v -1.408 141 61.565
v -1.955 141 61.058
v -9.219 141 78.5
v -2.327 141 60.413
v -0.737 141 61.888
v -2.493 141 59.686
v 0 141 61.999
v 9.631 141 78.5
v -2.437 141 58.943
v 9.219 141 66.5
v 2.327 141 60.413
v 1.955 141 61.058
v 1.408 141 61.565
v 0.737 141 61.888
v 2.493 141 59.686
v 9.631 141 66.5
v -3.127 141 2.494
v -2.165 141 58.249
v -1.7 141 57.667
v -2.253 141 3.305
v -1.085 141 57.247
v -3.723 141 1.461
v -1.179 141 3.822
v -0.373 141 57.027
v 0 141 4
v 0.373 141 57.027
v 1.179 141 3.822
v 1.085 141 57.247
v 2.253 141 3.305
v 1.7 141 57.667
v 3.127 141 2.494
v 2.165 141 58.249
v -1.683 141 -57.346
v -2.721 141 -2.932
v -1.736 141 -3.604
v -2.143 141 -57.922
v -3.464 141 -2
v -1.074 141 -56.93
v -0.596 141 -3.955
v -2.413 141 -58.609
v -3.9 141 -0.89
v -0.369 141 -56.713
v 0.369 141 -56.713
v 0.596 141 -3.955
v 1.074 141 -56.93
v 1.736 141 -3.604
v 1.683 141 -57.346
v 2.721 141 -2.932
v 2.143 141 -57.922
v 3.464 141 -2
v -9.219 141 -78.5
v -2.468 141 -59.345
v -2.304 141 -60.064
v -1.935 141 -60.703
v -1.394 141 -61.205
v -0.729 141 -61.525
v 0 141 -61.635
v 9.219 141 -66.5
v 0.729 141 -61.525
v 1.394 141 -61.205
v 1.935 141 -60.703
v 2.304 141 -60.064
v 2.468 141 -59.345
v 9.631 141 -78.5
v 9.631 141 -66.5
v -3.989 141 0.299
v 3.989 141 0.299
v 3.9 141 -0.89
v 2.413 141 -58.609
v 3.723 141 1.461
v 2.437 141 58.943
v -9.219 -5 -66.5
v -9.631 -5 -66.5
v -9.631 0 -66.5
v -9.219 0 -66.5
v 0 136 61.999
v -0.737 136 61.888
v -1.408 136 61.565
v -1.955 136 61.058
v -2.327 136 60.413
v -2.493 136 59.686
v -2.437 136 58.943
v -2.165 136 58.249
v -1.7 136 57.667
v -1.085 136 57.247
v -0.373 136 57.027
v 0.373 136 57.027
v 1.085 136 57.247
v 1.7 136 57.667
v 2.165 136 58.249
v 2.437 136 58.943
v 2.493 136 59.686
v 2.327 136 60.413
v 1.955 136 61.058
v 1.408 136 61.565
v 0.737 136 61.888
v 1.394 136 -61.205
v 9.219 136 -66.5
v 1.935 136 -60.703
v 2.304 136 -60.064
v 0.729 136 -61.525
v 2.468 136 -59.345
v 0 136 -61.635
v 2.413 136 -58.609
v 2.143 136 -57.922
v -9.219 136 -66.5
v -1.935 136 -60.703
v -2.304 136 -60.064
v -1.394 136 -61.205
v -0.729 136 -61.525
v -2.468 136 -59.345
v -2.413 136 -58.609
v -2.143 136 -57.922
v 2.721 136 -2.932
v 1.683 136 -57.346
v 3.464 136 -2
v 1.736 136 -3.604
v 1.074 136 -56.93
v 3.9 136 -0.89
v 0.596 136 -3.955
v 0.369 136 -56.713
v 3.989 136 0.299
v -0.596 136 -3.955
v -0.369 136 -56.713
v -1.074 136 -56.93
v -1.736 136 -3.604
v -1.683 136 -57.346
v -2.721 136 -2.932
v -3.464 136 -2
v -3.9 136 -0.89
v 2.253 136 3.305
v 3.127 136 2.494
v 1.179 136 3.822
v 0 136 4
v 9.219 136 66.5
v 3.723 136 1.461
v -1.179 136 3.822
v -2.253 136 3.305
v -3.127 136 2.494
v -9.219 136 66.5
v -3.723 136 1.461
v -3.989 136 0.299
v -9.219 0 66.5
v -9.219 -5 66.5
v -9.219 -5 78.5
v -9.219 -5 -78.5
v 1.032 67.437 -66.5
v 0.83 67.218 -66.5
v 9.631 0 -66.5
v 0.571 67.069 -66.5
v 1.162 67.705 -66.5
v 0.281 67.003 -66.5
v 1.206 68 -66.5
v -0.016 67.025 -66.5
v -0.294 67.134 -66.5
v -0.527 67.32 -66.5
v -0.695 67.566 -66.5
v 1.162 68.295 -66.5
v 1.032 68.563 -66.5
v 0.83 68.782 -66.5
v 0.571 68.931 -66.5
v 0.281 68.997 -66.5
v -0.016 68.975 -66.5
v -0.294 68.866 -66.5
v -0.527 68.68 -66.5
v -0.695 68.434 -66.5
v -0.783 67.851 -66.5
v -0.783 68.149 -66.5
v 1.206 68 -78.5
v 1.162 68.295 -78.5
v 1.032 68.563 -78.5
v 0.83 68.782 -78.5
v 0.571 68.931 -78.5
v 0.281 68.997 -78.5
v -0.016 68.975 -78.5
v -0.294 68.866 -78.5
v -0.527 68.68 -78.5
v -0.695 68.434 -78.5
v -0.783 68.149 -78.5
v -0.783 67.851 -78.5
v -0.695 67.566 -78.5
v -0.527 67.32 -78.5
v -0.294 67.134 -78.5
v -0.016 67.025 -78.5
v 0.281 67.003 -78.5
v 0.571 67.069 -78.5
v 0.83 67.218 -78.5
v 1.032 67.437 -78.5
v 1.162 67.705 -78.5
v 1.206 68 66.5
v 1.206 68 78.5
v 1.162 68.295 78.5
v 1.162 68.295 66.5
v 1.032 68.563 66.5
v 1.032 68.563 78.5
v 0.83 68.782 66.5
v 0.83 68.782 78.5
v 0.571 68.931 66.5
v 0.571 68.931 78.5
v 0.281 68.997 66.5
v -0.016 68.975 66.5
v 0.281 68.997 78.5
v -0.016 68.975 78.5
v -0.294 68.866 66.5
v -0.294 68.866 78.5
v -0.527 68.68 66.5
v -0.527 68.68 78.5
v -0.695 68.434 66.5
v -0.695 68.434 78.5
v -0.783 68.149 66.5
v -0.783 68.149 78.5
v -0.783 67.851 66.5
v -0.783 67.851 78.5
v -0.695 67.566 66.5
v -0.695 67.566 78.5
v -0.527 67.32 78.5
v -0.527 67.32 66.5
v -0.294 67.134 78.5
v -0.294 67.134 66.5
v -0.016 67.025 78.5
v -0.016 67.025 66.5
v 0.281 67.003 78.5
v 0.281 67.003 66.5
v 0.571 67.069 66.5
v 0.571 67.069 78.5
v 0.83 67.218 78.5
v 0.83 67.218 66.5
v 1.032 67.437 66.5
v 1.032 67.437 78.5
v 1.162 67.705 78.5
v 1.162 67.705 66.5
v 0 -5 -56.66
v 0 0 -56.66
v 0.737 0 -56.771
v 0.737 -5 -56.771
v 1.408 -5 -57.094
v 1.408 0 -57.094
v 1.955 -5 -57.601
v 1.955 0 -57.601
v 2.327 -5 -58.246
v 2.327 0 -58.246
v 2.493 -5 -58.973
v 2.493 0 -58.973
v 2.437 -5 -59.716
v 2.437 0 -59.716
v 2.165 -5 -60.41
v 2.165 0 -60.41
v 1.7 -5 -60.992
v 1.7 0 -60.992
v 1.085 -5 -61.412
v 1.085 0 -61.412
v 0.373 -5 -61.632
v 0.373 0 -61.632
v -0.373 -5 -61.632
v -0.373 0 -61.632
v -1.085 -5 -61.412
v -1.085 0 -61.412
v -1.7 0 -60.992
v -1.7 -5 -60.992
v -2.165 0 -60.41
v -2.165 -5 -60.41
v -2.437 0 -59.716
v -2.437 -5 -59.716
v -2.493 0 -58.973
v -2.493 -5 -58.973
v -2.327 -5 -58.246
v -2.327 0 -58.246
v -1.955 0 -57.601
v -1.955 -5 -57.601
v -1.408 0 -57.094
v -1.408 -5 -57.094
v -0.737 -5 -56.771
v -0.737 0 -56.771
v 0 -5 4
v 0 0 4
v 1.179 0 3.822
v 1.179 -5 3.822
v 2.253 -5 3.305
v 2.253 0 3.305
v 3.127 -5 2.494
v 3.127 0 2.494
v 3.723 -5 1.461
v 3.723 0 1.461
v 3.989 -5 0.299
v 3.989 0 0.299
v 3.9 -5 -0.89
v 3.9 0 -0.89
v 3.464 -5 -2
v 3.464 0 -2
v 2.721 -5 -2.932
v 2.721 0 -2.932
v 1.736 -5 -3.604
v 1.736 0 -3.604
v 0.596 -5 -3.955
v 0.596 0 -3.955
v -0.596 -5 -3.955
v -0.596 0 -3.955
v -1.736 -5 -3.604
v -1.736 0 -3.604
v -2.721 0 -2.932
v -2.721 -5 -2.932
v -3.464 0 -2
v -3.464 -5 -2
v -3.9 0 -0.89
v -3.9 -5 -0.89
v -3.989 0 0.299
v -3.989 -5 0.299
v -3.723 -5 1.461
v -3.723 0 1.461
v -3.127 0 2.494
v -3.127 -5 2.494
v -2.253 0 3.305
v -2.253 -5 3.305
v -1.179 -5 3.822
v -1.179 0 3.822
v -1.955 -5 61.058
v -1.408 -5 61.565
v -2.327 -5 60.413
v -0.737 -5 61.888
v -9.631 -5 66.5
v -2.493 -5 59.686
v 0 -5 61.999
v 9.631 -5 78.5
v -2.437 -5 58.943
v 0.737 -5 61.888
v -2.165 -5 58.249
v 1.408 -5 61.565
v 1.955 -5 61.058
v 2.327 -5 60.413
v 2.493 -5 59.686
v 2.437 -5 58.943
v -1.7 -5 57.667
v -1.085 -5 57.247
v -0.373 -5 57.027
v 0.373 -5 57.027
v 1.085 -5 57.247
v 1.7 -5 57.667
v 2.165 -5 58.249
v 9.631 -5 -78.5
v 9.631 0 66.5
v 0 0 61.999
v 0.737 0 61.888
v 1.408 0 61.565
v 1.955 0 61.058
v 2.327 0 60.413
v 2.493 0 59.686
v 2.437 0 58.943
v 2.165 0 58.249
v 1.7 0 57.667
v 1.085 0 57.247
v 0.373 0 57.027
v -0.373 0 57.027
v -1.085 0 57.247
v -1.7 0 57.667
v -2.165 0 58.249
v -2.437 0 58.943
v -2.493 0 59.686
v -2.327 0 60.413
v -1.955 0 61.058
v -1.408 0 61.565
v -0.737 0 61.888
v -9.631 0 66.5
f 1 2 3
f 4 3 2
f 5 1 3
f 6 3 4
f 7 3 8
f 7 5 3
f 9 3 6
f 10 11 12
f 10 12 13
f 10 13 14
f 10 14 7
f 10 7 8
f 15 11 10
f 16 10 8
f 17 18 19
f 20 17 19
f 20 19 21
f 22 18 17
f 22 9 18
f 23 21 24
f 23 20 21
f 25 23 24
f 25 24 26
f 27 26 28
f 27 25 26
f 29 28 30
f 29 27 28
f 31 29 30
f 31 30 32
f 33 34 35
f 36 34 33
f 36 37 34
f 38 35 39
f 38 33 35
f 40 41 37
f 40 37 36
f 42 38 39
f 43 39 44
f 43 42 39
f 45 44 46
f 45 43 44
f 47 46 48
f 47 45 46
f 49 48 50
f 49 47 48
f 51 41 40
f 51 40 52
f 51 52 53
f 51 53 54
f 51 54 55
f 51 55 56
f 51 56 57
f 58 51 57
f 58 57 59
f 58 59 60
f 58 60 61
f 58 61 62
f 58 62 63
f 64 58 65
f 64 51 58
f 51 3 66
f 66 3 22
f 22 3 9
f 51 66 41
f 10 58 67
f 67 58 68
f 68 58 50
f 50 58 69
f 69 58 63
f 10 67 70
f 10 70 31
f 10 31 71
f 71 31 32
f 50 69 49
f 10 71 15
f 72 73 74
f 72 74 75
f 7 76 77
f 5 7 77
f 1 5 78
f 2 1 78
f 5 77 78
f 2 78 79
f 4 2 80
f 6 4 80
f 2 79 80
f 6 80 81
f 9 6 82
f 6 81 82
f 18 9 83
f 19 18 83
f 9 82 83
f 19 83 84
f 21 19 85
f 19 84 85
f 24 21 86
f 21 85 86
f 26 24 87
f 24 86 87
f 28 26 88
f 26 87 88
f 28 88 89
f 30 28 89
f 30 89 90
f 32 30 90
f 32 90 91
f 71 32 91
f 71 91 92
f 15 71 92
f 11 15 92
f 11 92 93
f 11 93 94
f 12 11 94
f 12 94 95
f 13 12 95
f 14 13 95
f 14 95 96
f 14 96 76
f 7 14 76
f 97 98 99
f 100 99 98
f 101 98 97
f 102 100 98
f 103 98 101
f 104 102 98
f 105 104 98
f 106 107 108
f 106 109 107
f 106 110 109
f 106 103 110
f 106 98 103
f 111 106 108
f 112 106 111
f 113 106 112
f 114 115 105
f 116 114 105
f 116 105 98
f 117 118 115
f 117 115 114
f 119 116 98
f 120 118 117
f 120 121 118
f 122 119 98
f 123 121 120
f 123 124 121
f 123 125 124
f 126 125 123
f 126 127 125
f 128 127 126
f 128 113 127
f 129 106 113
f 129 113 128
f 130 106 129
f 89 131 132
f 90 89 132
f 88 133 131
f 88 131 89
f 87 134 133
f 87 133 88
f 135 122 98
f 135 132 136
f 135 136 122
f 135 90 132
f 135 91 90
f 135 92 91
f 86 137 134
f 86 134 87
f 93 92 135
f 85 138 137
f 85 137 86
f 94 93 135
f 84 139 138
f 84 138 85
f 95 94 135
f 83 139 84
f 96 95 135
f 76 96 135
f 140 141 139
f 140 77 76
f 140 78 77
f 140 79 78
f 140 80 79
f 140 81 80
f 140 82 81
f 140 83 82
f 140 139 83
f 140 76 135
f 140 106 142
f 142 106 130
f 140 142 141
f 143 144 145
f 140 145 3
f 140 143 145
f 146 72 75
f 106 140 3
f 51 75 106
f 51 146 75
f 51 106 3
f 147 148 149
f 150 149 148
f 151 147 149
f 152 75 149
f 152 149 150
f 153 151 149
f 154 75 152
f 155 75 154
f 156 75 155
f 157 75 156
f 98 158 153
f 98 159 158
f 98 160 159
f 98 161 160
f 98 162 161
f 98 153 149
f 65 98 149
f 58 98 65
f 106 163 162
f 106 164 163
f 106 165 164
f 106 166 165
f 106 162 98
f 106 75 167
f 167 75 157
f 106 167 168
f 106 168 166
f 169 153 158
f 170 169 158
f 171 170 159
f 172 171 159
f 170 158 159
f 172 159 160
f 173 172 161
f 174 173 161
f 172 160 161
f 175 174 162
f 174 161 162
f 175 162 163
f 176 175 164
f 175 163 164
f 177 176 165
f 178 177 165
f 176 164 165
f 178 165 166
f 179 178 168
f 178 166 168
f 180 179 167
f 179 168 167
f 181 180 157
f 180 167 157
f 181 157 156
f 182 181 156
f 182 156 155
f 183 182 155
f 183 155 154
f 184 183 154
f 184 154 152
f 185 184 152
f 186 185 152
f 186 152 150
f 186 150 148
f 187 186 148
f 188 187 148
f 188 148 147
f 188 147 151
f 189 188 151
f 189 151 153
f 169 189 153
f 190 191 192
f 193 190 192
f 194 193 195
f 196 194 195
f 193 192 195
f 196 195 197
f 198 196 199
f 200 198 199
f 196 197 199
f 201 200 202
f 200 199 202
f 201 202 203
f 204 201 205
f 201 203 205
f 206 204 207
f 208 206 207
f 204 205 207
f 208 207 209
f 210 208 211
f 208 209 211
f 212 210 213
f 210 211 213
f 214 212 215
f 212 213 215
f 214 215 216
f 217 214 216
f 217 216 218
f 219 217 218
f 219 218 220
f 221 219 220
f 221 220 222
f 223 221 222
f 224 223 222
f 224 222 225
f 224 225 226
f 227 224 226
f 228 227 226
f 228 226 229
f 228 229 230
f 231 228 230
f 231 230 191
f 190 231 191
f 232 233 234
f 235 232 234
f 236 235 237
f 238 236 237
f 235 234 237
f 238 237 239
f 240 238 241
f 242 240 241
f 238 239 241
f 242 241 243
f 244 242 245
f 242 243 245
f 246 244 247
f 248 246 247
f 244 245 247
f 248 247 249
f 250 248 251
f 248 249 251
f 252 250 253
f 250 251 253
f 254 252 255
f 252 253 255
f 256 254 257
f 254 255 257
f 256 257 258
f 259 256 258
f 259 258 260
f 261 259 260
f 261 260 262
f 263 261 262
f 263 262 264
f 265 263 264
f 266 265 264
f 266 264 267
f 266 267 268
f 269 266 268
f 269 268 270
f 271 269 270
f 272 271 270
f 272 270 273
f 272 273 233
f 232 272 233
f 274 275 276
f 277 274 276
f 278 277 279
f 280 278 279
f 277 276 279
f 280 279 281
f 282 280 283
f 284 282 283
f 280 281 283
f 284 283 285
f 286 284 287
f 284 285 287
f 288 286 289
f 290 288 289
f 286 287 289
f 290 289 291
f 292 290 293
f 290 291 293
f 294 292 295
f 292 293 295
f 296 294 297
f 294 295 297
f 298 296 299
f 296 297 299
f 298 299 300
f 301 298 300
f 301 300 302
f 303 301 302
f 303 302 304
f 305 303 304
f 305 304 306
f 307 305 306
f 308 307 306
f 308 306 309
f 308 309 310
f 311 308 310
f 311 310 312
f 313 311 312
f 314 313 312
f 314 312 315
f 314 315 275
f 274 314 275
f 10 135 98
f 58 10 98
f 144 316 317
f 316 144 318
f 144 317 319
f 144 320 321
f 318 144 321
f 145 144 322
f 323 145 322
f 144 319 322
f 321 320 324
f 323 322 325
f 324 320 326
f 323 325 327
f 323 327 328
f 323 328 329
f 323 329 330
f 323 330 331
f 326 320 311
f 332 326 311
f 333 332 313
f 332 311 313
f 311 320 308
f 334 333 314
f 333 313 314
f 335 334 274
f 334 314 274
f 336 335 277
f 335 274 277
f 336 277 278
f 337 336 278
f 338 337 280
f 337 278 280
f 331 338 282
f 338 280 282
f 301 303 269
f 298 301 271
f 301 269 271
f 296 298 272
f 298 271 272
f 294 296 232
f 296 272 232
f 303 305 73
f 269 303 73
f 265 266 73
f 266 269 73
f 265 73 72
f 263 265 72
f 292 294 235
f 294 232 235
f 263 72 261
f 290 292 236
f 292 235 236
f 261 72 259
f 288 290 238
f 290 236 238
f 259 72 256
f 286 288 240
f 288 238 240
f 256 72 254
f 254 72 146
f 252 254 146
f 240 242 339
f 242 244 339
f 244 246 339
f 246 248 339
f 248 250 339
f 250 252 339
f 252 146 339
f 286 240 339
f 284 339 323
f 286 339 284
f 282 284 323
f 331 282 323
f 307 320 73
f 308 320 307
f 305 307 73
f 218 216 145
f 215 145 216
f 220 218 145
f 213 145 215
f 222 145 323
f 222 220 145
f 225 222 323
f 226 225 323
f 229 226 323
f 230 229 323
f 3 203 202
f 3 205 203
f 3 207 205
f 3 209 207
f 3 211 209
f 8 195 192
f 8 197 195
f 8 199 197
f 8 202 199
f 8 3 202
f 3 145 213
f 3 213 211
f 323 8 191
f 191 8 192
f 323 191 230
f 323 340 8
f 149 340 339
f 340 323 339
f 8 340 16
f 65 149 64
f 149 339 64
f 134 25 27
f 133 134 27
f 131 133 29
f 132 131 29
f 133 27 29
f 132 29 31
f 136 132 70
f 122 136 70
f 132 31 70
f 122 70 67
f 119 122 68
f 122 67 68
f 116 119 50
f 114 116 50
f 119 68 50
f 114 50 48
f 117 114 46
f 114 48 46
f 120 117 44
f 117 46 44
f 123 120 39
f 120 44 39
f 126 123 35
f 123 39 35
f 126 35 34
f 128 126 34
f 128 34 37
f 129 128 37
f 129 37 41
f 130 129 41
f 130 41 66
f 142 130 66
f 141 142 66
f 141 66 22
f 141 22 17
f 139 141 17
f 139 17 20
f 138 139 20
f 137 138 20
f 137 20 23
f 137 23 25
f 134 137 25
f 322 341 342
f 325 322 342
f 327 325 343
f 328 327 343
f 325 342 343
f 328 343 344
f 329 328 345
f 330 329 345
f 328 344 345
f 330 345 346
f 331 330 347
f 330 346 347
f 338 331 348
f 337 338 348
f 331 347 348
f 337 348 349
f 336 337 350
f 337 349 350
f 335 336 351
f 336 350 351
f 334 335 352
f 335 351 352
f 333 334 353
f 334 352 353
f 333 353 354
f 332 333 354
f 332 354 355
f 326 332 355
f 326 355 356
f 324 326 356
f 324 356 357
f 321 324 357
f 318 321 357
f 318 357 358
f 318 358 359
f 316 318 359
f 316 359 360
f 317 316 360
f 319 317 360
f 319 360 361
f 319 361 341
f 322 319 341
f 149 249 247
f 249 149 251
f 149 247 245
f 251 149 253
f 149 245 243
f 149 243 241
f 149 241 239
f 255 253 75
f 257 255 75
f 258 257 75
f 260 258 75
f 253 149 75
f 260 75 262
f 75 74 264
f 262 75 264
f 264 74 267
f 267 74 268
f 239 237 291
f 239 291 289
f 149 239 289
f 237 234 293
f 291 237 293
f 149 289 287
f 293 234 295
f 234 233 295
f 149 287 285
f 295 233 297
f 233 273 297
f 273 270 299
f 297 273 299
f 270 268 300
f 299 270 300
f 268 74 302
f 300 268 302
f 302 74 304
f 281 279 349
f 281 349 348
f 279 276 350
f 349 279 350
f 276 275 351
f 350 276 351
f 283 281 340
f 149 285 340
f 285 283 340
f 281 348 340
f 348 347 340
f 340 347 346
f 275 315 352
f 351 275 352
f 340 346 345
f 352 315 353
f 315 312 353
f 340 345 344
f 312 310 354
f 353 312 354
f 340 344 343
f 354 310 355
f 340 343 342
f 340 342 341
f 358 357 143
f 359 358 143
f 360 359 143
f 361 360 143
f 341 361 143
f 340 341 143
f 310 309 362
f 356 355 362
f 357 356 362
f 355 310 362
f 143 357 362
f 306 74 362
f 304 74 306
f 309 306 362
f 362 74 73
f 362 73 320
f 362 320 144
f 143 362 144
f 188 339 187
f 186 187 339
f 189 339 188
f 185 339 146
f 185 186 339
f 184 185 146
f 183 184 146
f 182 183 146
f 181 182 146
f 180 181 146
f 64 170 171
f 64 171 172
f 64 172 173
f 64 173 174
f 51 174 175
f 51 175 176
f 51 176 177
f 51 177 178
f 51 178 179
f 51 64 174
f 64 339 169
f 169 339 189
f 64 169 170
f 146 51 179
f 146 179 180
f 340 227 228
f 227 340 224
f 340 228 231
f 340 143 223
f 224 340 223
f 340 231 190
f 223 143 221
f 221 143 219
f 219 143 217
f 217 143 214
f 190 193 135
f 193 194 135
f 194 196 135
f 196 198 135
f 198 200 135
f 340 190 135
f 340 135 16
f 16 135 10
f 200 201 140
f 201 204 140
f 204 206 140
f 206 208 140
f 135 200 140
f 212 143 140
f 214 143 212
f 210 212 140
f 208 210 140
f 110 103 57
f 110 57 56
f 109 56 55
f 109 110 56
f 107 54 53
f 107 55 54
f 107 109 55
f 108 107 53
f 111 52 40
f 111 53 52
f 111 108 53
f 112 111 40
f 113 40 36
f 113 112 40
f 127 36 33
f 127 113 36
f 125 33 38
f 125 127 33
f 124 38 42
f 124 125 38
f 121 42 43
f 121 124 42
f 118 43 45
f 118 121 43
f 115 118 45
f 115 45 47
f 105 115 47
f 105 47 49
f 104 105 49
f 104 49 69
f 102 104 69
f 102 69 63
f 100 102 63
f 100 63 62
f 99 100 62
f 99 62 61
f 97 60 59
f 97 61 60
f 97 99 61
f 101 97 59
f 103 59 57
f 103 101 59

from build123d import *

# Parameters (mm, degrees)
SKETCH1_W            = 133
SKETCH1_H            = 133
BOSS_EXTRUDE2_DEPTH  = 136
SKETCH2_W            = 133
SKETCH2_H            = 118
CUT_EXTRUDE1_DEPTH   = 136
BOSS_EXTRUDE3_DEPTH  = 10.5
SKETCH5_W            = 21
SKETCH5_H            = 3
BOSS_EXTRUDE4_DEPTH  = 23.5
SKETCH6_W            = 42
SKETCH6_H            = 17.2
CUT_EXTRUDE2_DEPTH   = 3
BOSS_EXTRUDE5_DEPTH  = 10.5
SKETCH8_W            = 21
SKETCH8_H            = 3
BOSS_EXTRUDE6_DEPTH  = 23.5
SKETCH9_W            = 42
SKETCH9_H            = 17.2
CUT_EXTRUDE3_DEPTH   = 3
SKETCH10_W           = 19.261488562
SKETCH10_H           = 133
BOSS_EXTRUDE7_DEPTH  = 5
SKETCH11_W           = 18.43727499
SKETCH11_H           = 133
BOSS_EXTRUDE8_DEPTH  = 5
SKETCH12_W           = 18.849381776
SKETCH12_H           = 146
BOSS_EXTRUDE9_DEPTH  = 12
SKETCH14_W           = 18.849381776
SKETCH14_H           = 146
BOSS_EXTRUDE10_DEPTH = 12
SKETCH17_R           = 1
CUT_EXTRUDE4_DEPTH   = 222.251553667
SKETCH18_W           = 133
SKETCH18_H           = 136
CUT_EXTRUDE5_DEPTH   = 170
SKETCH20_R           = 2.5
CUT_EXTRUDE6_DEPTH   = 10
SKETCH22_R           = 2.5
CUT_EXTRUDE8_DEPTH   = 170
SKETCH24_R           = 2.5
CUT_EXTRUDE9_DEPTH   = 170
SKETCH26_R           = 2.474722671
CUT_EXTRUDE10_DEPTH  = 177
SKETCH27_R           = 2.5
CUT_EXTRUDE11_DEPTH  = 177
SKETCH29_R           = 2.5
CUT_EXTRUDE12_DEPTH  = 177
SKETCH31_R           = 4
CUT_EXTRUDE13_DEPTH  = 173


with BuildPart() as part:
    # Sketch1 → Boss-Extrude2 (new body)
    with BuildSketch(Plane(origin=(0, 0, 0), x_dir=(1, 0, 0), z_dir=(0, 1, 0))):
        Rectangle(SKETCH1_W, SKETCH1_H)
    extrude(amount=BOSS_EXTRUDE2_DEPTH)

    # Sketch2 → Cut-Extrude1 (cut)
    with BuildSketch(Plane.XY.offset(66.5)):
        with Locations((0, 68)):
            Rectangle(SKETCH2_W, SKETCH2_H)
    extrude(amount=-CUT_EXTRUDE1_DEPTH, mode=Mode.SUBTRACT)


with BuildPart() as cut_extrude1_piece_1:
    # of the separate pieces the step leaves, piece 1, a body of its own (cut_extrude1_pieces)
    add(part.part.solids().sort_by_distance((-66.5, 0, 66.5))[0])

    # Sketch4 → Boss-Extrude3 (add)
    with BuildSketch(Plane(origin=(0, 9, 0), x_dir=(1, 0, 0), z_dir=(0, 1, 0))):
        Polygon((22.75, -22.75), (43.75, -22.75), (46.25, -22.75), (46.25, -20.25), (20.25, -20.25), (20.25, -46.25), (46.25, -46.25), (46.25, -43.75), (43.75, -43.75), (22.75, -43.75), align=None)
        Polygon((22.75, 43.75), (43.75, 43.75), (46.25, 43.75), (46.25, 46.25), (20.25, 46.25), (20.25, 20.25), (46.25, 20.25), (46.25, 22.75), (43.75, 22.75), (22.75, 22.75), align=None)
    extrude(amount=BOSS_EXTRUDE3_DEPTH)

    # Sketch5 → Boss-Extrude4 (add)
    with BuildSketch(Plane(origin=(22.75, 0, 0), x_dir=(0, 0, -1), z_dir=(1, 0, 0))):
        with Locations((-33.25, 18)):
            Rectangle(SKETCH5_W, SKETCH5_H)
        with Locations((33.25, 18)):
            Rectangle(SKETCH5_W, SKETCH5_H)
    extrude(amount=BOSS_EXTRUDE4_DEPTH)

    # Sketch6 → Cut-Extrude2 (cut)
    with BuildSketch(Plane(origin=(0, 19.5, 0), x_dir=(1, 0, 0), z_dir=(0, 1, 0))):
        with Locations((46.25, -33.25)):
            Rectangle(SKETCH6_W, SKETCH6_H)
        with Locations((46.25, 33.25)):
            Rectangle(SKETCH6_W, SKETCH6_H)
    extrude(amount=-CUT_EXTRUDE2_DEPTH, mode=Mode.SUBTRACT)

    # Sketch10 → Boss-Extrude7 (add)
    with BuildSketch(Plane.XZ):
        Rectangle(SKETCH10_W, SKETCH10_H)
    extrude(amount=BOSS_EXTRUDE7_DEPTH)



with BuildPart() as cut_extrude1_piece_2:
    # of the separate pieces the step leaves, piece 2, a body of its own (cut_extrude1_pieces)
    add(part.part.solids().sort_by_distance((66.5, 127, 66.5))[0])

    # Sketch7 → Boss-Extrude5 (add)
    with BuildSketch(Plane.XZ.offset(-127)):
        Polygon((-43.75, 43.75), (-22.75, 43.75), (-22.75, 22.75), (-43.75, 22.75), (-46.25, 22.75), (-46.25, 20.25), (-20.25, 20.25), (-20.25, 46.25), (-46.25, 46.25), (-46.25, 43.75), align=None)
        Polygon((-43.75, -22.75), (-22.75, -22.75), (-22.75, -43.75), (-43.75, -43.75), (-46.25, -43.75), (-46.25, -46.25), (-20.25, -46.25), (-20.25, -20.25), (-46.25, -20.25), (-46.25, -22.75), align=None)
    extrude(amount=BOSS_EXTRUDE5_DEPTH)

    # Sketch8 → Boss-Extrude6 (add)
    with BuildSketch(Plane.ZY.offset(22.75)):
        with Locations((33.25, 118)):
            Rectangle(SKETCH8_W, SKETCH8_H)
        with Locations((-33.25, 118)):
            Rectangle(SKETCH8_W, SKETCH8_H)
    extrude(amount=BOSS_EXTRUDE6_DEPTH)

    # Sketch9 → Cut-Extrude3 (cut)
    with BuildSketch(Plane.XZ.offset(-116.5)):
        with Locations((-46.25, 33.25)):
            Rectangle(SKETCH9_W, SKETCH9_H)
        with Locations((-46.25, -33.25)):
            Rectangle(SKETCH9_W, SKETCH9_H)
    extrude(amount=-CUT_EXTRUDE3_DEPTH, mode=Mode.SUBTRACT)

    # Sketch11 → Boss-Extrude8 (add)
    with BuildSketch(Plane(origin=(0, 136, 0), x_dir=(1, 0, 0), z_dir=(0, 1, 0))):
        Rectangle(SKETCH11_W, SKETCH11_H)
    extrude(amount=BOSS_EXTRUDE8_DEPTH)


with BuildPart() as cut_extrude1_piece_1_1:
    add(cut_extrude1_piece_1.part)

    add(cut_extrude1_piece_2.part)  # Boss-Extrude9 merges Cut-Extrude1 piece 2
    # Sketch12 → Boss-Extrude9 (add)
    with BuildSketch(Plane(origin=(0, 0, -66.5), x_dir=(-1, 0, 0), z_dir=(0, 0, -1))):
        with Locations((-0.206053393, 68)):
            Rectangle(SKETCH12_W, SKETCH12_H)
    extrude(amount=BOSS_EXTRUDE9_DEPTH)

    # Sketch14 → Boss-Extrude10 (add)
    with BuildSketch(Plane.XY.offset(66.5)):
        with Locations((0.206053393, 68)):
            Rectangle(SKETCH14_W, SKETCH14_H)
    extrude(amount=BOSS_EXTRUDE10_DEPTH)

    # Sketch17 → Cut-Extrude4 (cut, through all)
    with BuildSketch(Plane.XY.offset(78.5)):
        with Locations((0.206053393, 68)):
            Circle(SKETCH17_R)
    extrude(amount=-CUT_EXTRUDE4_DEPTH, mode=Mode.SUBTRACT)

    # Sketch18 → Cut-Extrude5 (cut)
    with BuildSketch(Plane.ZY.offset(66.5)):
        with Locations((0, 68)):
            Rectangle(SKETCH18_W, SKETCH18_H)
    extrude(amount=-CUT_EXTRUDE5_DEPTH, mode=Mode.SUBTRACT)

    # Sketch20 → Cut-Extrude6 (cut)
    with BuildSketch(Plane(origin=(0, 0, 0), x_dir=(1, 0, 0), z_dir=(0, 1, 0))):
        with Locations(Location((0, 0, 0), (0, 0, 270))):
            Circle(SKETCH20_R)
    extrude(amount=-CUT_EXTRUDE6_DEPTH, mode=Mode.SUBTRACT)

    # Sketch22 → Cut-Extrude8 (cut)
    with BuildSketch(Plane(origin=(0, 0, 0), x_dir=(1, 0, 0), z_dir=(0, 1, 0))):
        with Locations(Location((0, 0, 0), (0, 0, 270))):
            Circle(SKETCH22_R)
    extrude(amount=CUT_EXTRUDE8_DEPTH, mode=Mode.SUBTRACT)

    # Sketch24 → Cut-Extrude9 (cut)
    with BuildSketch(Plane(origin=(0, 0, 0), x_dir=(1, 0, 0), z_dir=(0, 1, 0))):
        with Locations(Location((0, 59.159797643, 0), (0, 0, 270))):
            Circle(SKETCH24_R)
    extrude(amount=-CUT_EXTRUDE9_DEPTH, mode=Mode.SUBTRACT)

    # Sketch26 → Cut-Extrude10 (cut)
    with BuildSketch(Plane(origin=(0, 9, 0), x_dir=(1, 0, 0), z_dir=(0, 1, 0))):
        with Locations(Location((0, 59.159797643, 0), (0, 0, 90))):
            Circle(SKETCH26_R)
    extrude(amount=CUT_EXTRUDE10_DEPTH, mode=Mode.SUBTRACT)

    # Sketch27 → Cut-Extrude11 (cut)
    with BuildSketch(Plane(origin=(0, 0, 0), x_dir=(1, 0, 0), z_dir=(0, 1, 0))):
        with Locations(Location((0, -59.499471122, 0), (0, 0, 270))):
            Circle(SKETCH27_R)
    extrude(amount=-CUT_EXTRUDE11_DEPTH, mode=Mode.SUBTRACT)

    # Sketch29 → Cut-Extrude12 (cut)
    with BuildSketch(Plane.XZ.offset(5)):
        with Locations(Location((0, 59.499471122, 0), (0, 0, 90))):
            Circle(SKETCH29_R)
    extrude(amount=-CUT_EXTRUDE12_DEPTH, mode=Mode.SUBTRACT)

    # Sketch31 → Cut-Extrude13 (cut)
    with BuildSketch(Plane(origin=(0, 141, 0), x_dir=(1, 0, 0), z_dir=(0, 1, 0))):
        with Locations(Location((0, 0, 0), (0, 0, 270))):
            Circle(SKETCH31_R)
    extrude(amount=-CUT_EXTRUDE13_DEPTH, mode=Mode.SUBTRACT)


solid = cut_extrude1_piece_1_1.part
